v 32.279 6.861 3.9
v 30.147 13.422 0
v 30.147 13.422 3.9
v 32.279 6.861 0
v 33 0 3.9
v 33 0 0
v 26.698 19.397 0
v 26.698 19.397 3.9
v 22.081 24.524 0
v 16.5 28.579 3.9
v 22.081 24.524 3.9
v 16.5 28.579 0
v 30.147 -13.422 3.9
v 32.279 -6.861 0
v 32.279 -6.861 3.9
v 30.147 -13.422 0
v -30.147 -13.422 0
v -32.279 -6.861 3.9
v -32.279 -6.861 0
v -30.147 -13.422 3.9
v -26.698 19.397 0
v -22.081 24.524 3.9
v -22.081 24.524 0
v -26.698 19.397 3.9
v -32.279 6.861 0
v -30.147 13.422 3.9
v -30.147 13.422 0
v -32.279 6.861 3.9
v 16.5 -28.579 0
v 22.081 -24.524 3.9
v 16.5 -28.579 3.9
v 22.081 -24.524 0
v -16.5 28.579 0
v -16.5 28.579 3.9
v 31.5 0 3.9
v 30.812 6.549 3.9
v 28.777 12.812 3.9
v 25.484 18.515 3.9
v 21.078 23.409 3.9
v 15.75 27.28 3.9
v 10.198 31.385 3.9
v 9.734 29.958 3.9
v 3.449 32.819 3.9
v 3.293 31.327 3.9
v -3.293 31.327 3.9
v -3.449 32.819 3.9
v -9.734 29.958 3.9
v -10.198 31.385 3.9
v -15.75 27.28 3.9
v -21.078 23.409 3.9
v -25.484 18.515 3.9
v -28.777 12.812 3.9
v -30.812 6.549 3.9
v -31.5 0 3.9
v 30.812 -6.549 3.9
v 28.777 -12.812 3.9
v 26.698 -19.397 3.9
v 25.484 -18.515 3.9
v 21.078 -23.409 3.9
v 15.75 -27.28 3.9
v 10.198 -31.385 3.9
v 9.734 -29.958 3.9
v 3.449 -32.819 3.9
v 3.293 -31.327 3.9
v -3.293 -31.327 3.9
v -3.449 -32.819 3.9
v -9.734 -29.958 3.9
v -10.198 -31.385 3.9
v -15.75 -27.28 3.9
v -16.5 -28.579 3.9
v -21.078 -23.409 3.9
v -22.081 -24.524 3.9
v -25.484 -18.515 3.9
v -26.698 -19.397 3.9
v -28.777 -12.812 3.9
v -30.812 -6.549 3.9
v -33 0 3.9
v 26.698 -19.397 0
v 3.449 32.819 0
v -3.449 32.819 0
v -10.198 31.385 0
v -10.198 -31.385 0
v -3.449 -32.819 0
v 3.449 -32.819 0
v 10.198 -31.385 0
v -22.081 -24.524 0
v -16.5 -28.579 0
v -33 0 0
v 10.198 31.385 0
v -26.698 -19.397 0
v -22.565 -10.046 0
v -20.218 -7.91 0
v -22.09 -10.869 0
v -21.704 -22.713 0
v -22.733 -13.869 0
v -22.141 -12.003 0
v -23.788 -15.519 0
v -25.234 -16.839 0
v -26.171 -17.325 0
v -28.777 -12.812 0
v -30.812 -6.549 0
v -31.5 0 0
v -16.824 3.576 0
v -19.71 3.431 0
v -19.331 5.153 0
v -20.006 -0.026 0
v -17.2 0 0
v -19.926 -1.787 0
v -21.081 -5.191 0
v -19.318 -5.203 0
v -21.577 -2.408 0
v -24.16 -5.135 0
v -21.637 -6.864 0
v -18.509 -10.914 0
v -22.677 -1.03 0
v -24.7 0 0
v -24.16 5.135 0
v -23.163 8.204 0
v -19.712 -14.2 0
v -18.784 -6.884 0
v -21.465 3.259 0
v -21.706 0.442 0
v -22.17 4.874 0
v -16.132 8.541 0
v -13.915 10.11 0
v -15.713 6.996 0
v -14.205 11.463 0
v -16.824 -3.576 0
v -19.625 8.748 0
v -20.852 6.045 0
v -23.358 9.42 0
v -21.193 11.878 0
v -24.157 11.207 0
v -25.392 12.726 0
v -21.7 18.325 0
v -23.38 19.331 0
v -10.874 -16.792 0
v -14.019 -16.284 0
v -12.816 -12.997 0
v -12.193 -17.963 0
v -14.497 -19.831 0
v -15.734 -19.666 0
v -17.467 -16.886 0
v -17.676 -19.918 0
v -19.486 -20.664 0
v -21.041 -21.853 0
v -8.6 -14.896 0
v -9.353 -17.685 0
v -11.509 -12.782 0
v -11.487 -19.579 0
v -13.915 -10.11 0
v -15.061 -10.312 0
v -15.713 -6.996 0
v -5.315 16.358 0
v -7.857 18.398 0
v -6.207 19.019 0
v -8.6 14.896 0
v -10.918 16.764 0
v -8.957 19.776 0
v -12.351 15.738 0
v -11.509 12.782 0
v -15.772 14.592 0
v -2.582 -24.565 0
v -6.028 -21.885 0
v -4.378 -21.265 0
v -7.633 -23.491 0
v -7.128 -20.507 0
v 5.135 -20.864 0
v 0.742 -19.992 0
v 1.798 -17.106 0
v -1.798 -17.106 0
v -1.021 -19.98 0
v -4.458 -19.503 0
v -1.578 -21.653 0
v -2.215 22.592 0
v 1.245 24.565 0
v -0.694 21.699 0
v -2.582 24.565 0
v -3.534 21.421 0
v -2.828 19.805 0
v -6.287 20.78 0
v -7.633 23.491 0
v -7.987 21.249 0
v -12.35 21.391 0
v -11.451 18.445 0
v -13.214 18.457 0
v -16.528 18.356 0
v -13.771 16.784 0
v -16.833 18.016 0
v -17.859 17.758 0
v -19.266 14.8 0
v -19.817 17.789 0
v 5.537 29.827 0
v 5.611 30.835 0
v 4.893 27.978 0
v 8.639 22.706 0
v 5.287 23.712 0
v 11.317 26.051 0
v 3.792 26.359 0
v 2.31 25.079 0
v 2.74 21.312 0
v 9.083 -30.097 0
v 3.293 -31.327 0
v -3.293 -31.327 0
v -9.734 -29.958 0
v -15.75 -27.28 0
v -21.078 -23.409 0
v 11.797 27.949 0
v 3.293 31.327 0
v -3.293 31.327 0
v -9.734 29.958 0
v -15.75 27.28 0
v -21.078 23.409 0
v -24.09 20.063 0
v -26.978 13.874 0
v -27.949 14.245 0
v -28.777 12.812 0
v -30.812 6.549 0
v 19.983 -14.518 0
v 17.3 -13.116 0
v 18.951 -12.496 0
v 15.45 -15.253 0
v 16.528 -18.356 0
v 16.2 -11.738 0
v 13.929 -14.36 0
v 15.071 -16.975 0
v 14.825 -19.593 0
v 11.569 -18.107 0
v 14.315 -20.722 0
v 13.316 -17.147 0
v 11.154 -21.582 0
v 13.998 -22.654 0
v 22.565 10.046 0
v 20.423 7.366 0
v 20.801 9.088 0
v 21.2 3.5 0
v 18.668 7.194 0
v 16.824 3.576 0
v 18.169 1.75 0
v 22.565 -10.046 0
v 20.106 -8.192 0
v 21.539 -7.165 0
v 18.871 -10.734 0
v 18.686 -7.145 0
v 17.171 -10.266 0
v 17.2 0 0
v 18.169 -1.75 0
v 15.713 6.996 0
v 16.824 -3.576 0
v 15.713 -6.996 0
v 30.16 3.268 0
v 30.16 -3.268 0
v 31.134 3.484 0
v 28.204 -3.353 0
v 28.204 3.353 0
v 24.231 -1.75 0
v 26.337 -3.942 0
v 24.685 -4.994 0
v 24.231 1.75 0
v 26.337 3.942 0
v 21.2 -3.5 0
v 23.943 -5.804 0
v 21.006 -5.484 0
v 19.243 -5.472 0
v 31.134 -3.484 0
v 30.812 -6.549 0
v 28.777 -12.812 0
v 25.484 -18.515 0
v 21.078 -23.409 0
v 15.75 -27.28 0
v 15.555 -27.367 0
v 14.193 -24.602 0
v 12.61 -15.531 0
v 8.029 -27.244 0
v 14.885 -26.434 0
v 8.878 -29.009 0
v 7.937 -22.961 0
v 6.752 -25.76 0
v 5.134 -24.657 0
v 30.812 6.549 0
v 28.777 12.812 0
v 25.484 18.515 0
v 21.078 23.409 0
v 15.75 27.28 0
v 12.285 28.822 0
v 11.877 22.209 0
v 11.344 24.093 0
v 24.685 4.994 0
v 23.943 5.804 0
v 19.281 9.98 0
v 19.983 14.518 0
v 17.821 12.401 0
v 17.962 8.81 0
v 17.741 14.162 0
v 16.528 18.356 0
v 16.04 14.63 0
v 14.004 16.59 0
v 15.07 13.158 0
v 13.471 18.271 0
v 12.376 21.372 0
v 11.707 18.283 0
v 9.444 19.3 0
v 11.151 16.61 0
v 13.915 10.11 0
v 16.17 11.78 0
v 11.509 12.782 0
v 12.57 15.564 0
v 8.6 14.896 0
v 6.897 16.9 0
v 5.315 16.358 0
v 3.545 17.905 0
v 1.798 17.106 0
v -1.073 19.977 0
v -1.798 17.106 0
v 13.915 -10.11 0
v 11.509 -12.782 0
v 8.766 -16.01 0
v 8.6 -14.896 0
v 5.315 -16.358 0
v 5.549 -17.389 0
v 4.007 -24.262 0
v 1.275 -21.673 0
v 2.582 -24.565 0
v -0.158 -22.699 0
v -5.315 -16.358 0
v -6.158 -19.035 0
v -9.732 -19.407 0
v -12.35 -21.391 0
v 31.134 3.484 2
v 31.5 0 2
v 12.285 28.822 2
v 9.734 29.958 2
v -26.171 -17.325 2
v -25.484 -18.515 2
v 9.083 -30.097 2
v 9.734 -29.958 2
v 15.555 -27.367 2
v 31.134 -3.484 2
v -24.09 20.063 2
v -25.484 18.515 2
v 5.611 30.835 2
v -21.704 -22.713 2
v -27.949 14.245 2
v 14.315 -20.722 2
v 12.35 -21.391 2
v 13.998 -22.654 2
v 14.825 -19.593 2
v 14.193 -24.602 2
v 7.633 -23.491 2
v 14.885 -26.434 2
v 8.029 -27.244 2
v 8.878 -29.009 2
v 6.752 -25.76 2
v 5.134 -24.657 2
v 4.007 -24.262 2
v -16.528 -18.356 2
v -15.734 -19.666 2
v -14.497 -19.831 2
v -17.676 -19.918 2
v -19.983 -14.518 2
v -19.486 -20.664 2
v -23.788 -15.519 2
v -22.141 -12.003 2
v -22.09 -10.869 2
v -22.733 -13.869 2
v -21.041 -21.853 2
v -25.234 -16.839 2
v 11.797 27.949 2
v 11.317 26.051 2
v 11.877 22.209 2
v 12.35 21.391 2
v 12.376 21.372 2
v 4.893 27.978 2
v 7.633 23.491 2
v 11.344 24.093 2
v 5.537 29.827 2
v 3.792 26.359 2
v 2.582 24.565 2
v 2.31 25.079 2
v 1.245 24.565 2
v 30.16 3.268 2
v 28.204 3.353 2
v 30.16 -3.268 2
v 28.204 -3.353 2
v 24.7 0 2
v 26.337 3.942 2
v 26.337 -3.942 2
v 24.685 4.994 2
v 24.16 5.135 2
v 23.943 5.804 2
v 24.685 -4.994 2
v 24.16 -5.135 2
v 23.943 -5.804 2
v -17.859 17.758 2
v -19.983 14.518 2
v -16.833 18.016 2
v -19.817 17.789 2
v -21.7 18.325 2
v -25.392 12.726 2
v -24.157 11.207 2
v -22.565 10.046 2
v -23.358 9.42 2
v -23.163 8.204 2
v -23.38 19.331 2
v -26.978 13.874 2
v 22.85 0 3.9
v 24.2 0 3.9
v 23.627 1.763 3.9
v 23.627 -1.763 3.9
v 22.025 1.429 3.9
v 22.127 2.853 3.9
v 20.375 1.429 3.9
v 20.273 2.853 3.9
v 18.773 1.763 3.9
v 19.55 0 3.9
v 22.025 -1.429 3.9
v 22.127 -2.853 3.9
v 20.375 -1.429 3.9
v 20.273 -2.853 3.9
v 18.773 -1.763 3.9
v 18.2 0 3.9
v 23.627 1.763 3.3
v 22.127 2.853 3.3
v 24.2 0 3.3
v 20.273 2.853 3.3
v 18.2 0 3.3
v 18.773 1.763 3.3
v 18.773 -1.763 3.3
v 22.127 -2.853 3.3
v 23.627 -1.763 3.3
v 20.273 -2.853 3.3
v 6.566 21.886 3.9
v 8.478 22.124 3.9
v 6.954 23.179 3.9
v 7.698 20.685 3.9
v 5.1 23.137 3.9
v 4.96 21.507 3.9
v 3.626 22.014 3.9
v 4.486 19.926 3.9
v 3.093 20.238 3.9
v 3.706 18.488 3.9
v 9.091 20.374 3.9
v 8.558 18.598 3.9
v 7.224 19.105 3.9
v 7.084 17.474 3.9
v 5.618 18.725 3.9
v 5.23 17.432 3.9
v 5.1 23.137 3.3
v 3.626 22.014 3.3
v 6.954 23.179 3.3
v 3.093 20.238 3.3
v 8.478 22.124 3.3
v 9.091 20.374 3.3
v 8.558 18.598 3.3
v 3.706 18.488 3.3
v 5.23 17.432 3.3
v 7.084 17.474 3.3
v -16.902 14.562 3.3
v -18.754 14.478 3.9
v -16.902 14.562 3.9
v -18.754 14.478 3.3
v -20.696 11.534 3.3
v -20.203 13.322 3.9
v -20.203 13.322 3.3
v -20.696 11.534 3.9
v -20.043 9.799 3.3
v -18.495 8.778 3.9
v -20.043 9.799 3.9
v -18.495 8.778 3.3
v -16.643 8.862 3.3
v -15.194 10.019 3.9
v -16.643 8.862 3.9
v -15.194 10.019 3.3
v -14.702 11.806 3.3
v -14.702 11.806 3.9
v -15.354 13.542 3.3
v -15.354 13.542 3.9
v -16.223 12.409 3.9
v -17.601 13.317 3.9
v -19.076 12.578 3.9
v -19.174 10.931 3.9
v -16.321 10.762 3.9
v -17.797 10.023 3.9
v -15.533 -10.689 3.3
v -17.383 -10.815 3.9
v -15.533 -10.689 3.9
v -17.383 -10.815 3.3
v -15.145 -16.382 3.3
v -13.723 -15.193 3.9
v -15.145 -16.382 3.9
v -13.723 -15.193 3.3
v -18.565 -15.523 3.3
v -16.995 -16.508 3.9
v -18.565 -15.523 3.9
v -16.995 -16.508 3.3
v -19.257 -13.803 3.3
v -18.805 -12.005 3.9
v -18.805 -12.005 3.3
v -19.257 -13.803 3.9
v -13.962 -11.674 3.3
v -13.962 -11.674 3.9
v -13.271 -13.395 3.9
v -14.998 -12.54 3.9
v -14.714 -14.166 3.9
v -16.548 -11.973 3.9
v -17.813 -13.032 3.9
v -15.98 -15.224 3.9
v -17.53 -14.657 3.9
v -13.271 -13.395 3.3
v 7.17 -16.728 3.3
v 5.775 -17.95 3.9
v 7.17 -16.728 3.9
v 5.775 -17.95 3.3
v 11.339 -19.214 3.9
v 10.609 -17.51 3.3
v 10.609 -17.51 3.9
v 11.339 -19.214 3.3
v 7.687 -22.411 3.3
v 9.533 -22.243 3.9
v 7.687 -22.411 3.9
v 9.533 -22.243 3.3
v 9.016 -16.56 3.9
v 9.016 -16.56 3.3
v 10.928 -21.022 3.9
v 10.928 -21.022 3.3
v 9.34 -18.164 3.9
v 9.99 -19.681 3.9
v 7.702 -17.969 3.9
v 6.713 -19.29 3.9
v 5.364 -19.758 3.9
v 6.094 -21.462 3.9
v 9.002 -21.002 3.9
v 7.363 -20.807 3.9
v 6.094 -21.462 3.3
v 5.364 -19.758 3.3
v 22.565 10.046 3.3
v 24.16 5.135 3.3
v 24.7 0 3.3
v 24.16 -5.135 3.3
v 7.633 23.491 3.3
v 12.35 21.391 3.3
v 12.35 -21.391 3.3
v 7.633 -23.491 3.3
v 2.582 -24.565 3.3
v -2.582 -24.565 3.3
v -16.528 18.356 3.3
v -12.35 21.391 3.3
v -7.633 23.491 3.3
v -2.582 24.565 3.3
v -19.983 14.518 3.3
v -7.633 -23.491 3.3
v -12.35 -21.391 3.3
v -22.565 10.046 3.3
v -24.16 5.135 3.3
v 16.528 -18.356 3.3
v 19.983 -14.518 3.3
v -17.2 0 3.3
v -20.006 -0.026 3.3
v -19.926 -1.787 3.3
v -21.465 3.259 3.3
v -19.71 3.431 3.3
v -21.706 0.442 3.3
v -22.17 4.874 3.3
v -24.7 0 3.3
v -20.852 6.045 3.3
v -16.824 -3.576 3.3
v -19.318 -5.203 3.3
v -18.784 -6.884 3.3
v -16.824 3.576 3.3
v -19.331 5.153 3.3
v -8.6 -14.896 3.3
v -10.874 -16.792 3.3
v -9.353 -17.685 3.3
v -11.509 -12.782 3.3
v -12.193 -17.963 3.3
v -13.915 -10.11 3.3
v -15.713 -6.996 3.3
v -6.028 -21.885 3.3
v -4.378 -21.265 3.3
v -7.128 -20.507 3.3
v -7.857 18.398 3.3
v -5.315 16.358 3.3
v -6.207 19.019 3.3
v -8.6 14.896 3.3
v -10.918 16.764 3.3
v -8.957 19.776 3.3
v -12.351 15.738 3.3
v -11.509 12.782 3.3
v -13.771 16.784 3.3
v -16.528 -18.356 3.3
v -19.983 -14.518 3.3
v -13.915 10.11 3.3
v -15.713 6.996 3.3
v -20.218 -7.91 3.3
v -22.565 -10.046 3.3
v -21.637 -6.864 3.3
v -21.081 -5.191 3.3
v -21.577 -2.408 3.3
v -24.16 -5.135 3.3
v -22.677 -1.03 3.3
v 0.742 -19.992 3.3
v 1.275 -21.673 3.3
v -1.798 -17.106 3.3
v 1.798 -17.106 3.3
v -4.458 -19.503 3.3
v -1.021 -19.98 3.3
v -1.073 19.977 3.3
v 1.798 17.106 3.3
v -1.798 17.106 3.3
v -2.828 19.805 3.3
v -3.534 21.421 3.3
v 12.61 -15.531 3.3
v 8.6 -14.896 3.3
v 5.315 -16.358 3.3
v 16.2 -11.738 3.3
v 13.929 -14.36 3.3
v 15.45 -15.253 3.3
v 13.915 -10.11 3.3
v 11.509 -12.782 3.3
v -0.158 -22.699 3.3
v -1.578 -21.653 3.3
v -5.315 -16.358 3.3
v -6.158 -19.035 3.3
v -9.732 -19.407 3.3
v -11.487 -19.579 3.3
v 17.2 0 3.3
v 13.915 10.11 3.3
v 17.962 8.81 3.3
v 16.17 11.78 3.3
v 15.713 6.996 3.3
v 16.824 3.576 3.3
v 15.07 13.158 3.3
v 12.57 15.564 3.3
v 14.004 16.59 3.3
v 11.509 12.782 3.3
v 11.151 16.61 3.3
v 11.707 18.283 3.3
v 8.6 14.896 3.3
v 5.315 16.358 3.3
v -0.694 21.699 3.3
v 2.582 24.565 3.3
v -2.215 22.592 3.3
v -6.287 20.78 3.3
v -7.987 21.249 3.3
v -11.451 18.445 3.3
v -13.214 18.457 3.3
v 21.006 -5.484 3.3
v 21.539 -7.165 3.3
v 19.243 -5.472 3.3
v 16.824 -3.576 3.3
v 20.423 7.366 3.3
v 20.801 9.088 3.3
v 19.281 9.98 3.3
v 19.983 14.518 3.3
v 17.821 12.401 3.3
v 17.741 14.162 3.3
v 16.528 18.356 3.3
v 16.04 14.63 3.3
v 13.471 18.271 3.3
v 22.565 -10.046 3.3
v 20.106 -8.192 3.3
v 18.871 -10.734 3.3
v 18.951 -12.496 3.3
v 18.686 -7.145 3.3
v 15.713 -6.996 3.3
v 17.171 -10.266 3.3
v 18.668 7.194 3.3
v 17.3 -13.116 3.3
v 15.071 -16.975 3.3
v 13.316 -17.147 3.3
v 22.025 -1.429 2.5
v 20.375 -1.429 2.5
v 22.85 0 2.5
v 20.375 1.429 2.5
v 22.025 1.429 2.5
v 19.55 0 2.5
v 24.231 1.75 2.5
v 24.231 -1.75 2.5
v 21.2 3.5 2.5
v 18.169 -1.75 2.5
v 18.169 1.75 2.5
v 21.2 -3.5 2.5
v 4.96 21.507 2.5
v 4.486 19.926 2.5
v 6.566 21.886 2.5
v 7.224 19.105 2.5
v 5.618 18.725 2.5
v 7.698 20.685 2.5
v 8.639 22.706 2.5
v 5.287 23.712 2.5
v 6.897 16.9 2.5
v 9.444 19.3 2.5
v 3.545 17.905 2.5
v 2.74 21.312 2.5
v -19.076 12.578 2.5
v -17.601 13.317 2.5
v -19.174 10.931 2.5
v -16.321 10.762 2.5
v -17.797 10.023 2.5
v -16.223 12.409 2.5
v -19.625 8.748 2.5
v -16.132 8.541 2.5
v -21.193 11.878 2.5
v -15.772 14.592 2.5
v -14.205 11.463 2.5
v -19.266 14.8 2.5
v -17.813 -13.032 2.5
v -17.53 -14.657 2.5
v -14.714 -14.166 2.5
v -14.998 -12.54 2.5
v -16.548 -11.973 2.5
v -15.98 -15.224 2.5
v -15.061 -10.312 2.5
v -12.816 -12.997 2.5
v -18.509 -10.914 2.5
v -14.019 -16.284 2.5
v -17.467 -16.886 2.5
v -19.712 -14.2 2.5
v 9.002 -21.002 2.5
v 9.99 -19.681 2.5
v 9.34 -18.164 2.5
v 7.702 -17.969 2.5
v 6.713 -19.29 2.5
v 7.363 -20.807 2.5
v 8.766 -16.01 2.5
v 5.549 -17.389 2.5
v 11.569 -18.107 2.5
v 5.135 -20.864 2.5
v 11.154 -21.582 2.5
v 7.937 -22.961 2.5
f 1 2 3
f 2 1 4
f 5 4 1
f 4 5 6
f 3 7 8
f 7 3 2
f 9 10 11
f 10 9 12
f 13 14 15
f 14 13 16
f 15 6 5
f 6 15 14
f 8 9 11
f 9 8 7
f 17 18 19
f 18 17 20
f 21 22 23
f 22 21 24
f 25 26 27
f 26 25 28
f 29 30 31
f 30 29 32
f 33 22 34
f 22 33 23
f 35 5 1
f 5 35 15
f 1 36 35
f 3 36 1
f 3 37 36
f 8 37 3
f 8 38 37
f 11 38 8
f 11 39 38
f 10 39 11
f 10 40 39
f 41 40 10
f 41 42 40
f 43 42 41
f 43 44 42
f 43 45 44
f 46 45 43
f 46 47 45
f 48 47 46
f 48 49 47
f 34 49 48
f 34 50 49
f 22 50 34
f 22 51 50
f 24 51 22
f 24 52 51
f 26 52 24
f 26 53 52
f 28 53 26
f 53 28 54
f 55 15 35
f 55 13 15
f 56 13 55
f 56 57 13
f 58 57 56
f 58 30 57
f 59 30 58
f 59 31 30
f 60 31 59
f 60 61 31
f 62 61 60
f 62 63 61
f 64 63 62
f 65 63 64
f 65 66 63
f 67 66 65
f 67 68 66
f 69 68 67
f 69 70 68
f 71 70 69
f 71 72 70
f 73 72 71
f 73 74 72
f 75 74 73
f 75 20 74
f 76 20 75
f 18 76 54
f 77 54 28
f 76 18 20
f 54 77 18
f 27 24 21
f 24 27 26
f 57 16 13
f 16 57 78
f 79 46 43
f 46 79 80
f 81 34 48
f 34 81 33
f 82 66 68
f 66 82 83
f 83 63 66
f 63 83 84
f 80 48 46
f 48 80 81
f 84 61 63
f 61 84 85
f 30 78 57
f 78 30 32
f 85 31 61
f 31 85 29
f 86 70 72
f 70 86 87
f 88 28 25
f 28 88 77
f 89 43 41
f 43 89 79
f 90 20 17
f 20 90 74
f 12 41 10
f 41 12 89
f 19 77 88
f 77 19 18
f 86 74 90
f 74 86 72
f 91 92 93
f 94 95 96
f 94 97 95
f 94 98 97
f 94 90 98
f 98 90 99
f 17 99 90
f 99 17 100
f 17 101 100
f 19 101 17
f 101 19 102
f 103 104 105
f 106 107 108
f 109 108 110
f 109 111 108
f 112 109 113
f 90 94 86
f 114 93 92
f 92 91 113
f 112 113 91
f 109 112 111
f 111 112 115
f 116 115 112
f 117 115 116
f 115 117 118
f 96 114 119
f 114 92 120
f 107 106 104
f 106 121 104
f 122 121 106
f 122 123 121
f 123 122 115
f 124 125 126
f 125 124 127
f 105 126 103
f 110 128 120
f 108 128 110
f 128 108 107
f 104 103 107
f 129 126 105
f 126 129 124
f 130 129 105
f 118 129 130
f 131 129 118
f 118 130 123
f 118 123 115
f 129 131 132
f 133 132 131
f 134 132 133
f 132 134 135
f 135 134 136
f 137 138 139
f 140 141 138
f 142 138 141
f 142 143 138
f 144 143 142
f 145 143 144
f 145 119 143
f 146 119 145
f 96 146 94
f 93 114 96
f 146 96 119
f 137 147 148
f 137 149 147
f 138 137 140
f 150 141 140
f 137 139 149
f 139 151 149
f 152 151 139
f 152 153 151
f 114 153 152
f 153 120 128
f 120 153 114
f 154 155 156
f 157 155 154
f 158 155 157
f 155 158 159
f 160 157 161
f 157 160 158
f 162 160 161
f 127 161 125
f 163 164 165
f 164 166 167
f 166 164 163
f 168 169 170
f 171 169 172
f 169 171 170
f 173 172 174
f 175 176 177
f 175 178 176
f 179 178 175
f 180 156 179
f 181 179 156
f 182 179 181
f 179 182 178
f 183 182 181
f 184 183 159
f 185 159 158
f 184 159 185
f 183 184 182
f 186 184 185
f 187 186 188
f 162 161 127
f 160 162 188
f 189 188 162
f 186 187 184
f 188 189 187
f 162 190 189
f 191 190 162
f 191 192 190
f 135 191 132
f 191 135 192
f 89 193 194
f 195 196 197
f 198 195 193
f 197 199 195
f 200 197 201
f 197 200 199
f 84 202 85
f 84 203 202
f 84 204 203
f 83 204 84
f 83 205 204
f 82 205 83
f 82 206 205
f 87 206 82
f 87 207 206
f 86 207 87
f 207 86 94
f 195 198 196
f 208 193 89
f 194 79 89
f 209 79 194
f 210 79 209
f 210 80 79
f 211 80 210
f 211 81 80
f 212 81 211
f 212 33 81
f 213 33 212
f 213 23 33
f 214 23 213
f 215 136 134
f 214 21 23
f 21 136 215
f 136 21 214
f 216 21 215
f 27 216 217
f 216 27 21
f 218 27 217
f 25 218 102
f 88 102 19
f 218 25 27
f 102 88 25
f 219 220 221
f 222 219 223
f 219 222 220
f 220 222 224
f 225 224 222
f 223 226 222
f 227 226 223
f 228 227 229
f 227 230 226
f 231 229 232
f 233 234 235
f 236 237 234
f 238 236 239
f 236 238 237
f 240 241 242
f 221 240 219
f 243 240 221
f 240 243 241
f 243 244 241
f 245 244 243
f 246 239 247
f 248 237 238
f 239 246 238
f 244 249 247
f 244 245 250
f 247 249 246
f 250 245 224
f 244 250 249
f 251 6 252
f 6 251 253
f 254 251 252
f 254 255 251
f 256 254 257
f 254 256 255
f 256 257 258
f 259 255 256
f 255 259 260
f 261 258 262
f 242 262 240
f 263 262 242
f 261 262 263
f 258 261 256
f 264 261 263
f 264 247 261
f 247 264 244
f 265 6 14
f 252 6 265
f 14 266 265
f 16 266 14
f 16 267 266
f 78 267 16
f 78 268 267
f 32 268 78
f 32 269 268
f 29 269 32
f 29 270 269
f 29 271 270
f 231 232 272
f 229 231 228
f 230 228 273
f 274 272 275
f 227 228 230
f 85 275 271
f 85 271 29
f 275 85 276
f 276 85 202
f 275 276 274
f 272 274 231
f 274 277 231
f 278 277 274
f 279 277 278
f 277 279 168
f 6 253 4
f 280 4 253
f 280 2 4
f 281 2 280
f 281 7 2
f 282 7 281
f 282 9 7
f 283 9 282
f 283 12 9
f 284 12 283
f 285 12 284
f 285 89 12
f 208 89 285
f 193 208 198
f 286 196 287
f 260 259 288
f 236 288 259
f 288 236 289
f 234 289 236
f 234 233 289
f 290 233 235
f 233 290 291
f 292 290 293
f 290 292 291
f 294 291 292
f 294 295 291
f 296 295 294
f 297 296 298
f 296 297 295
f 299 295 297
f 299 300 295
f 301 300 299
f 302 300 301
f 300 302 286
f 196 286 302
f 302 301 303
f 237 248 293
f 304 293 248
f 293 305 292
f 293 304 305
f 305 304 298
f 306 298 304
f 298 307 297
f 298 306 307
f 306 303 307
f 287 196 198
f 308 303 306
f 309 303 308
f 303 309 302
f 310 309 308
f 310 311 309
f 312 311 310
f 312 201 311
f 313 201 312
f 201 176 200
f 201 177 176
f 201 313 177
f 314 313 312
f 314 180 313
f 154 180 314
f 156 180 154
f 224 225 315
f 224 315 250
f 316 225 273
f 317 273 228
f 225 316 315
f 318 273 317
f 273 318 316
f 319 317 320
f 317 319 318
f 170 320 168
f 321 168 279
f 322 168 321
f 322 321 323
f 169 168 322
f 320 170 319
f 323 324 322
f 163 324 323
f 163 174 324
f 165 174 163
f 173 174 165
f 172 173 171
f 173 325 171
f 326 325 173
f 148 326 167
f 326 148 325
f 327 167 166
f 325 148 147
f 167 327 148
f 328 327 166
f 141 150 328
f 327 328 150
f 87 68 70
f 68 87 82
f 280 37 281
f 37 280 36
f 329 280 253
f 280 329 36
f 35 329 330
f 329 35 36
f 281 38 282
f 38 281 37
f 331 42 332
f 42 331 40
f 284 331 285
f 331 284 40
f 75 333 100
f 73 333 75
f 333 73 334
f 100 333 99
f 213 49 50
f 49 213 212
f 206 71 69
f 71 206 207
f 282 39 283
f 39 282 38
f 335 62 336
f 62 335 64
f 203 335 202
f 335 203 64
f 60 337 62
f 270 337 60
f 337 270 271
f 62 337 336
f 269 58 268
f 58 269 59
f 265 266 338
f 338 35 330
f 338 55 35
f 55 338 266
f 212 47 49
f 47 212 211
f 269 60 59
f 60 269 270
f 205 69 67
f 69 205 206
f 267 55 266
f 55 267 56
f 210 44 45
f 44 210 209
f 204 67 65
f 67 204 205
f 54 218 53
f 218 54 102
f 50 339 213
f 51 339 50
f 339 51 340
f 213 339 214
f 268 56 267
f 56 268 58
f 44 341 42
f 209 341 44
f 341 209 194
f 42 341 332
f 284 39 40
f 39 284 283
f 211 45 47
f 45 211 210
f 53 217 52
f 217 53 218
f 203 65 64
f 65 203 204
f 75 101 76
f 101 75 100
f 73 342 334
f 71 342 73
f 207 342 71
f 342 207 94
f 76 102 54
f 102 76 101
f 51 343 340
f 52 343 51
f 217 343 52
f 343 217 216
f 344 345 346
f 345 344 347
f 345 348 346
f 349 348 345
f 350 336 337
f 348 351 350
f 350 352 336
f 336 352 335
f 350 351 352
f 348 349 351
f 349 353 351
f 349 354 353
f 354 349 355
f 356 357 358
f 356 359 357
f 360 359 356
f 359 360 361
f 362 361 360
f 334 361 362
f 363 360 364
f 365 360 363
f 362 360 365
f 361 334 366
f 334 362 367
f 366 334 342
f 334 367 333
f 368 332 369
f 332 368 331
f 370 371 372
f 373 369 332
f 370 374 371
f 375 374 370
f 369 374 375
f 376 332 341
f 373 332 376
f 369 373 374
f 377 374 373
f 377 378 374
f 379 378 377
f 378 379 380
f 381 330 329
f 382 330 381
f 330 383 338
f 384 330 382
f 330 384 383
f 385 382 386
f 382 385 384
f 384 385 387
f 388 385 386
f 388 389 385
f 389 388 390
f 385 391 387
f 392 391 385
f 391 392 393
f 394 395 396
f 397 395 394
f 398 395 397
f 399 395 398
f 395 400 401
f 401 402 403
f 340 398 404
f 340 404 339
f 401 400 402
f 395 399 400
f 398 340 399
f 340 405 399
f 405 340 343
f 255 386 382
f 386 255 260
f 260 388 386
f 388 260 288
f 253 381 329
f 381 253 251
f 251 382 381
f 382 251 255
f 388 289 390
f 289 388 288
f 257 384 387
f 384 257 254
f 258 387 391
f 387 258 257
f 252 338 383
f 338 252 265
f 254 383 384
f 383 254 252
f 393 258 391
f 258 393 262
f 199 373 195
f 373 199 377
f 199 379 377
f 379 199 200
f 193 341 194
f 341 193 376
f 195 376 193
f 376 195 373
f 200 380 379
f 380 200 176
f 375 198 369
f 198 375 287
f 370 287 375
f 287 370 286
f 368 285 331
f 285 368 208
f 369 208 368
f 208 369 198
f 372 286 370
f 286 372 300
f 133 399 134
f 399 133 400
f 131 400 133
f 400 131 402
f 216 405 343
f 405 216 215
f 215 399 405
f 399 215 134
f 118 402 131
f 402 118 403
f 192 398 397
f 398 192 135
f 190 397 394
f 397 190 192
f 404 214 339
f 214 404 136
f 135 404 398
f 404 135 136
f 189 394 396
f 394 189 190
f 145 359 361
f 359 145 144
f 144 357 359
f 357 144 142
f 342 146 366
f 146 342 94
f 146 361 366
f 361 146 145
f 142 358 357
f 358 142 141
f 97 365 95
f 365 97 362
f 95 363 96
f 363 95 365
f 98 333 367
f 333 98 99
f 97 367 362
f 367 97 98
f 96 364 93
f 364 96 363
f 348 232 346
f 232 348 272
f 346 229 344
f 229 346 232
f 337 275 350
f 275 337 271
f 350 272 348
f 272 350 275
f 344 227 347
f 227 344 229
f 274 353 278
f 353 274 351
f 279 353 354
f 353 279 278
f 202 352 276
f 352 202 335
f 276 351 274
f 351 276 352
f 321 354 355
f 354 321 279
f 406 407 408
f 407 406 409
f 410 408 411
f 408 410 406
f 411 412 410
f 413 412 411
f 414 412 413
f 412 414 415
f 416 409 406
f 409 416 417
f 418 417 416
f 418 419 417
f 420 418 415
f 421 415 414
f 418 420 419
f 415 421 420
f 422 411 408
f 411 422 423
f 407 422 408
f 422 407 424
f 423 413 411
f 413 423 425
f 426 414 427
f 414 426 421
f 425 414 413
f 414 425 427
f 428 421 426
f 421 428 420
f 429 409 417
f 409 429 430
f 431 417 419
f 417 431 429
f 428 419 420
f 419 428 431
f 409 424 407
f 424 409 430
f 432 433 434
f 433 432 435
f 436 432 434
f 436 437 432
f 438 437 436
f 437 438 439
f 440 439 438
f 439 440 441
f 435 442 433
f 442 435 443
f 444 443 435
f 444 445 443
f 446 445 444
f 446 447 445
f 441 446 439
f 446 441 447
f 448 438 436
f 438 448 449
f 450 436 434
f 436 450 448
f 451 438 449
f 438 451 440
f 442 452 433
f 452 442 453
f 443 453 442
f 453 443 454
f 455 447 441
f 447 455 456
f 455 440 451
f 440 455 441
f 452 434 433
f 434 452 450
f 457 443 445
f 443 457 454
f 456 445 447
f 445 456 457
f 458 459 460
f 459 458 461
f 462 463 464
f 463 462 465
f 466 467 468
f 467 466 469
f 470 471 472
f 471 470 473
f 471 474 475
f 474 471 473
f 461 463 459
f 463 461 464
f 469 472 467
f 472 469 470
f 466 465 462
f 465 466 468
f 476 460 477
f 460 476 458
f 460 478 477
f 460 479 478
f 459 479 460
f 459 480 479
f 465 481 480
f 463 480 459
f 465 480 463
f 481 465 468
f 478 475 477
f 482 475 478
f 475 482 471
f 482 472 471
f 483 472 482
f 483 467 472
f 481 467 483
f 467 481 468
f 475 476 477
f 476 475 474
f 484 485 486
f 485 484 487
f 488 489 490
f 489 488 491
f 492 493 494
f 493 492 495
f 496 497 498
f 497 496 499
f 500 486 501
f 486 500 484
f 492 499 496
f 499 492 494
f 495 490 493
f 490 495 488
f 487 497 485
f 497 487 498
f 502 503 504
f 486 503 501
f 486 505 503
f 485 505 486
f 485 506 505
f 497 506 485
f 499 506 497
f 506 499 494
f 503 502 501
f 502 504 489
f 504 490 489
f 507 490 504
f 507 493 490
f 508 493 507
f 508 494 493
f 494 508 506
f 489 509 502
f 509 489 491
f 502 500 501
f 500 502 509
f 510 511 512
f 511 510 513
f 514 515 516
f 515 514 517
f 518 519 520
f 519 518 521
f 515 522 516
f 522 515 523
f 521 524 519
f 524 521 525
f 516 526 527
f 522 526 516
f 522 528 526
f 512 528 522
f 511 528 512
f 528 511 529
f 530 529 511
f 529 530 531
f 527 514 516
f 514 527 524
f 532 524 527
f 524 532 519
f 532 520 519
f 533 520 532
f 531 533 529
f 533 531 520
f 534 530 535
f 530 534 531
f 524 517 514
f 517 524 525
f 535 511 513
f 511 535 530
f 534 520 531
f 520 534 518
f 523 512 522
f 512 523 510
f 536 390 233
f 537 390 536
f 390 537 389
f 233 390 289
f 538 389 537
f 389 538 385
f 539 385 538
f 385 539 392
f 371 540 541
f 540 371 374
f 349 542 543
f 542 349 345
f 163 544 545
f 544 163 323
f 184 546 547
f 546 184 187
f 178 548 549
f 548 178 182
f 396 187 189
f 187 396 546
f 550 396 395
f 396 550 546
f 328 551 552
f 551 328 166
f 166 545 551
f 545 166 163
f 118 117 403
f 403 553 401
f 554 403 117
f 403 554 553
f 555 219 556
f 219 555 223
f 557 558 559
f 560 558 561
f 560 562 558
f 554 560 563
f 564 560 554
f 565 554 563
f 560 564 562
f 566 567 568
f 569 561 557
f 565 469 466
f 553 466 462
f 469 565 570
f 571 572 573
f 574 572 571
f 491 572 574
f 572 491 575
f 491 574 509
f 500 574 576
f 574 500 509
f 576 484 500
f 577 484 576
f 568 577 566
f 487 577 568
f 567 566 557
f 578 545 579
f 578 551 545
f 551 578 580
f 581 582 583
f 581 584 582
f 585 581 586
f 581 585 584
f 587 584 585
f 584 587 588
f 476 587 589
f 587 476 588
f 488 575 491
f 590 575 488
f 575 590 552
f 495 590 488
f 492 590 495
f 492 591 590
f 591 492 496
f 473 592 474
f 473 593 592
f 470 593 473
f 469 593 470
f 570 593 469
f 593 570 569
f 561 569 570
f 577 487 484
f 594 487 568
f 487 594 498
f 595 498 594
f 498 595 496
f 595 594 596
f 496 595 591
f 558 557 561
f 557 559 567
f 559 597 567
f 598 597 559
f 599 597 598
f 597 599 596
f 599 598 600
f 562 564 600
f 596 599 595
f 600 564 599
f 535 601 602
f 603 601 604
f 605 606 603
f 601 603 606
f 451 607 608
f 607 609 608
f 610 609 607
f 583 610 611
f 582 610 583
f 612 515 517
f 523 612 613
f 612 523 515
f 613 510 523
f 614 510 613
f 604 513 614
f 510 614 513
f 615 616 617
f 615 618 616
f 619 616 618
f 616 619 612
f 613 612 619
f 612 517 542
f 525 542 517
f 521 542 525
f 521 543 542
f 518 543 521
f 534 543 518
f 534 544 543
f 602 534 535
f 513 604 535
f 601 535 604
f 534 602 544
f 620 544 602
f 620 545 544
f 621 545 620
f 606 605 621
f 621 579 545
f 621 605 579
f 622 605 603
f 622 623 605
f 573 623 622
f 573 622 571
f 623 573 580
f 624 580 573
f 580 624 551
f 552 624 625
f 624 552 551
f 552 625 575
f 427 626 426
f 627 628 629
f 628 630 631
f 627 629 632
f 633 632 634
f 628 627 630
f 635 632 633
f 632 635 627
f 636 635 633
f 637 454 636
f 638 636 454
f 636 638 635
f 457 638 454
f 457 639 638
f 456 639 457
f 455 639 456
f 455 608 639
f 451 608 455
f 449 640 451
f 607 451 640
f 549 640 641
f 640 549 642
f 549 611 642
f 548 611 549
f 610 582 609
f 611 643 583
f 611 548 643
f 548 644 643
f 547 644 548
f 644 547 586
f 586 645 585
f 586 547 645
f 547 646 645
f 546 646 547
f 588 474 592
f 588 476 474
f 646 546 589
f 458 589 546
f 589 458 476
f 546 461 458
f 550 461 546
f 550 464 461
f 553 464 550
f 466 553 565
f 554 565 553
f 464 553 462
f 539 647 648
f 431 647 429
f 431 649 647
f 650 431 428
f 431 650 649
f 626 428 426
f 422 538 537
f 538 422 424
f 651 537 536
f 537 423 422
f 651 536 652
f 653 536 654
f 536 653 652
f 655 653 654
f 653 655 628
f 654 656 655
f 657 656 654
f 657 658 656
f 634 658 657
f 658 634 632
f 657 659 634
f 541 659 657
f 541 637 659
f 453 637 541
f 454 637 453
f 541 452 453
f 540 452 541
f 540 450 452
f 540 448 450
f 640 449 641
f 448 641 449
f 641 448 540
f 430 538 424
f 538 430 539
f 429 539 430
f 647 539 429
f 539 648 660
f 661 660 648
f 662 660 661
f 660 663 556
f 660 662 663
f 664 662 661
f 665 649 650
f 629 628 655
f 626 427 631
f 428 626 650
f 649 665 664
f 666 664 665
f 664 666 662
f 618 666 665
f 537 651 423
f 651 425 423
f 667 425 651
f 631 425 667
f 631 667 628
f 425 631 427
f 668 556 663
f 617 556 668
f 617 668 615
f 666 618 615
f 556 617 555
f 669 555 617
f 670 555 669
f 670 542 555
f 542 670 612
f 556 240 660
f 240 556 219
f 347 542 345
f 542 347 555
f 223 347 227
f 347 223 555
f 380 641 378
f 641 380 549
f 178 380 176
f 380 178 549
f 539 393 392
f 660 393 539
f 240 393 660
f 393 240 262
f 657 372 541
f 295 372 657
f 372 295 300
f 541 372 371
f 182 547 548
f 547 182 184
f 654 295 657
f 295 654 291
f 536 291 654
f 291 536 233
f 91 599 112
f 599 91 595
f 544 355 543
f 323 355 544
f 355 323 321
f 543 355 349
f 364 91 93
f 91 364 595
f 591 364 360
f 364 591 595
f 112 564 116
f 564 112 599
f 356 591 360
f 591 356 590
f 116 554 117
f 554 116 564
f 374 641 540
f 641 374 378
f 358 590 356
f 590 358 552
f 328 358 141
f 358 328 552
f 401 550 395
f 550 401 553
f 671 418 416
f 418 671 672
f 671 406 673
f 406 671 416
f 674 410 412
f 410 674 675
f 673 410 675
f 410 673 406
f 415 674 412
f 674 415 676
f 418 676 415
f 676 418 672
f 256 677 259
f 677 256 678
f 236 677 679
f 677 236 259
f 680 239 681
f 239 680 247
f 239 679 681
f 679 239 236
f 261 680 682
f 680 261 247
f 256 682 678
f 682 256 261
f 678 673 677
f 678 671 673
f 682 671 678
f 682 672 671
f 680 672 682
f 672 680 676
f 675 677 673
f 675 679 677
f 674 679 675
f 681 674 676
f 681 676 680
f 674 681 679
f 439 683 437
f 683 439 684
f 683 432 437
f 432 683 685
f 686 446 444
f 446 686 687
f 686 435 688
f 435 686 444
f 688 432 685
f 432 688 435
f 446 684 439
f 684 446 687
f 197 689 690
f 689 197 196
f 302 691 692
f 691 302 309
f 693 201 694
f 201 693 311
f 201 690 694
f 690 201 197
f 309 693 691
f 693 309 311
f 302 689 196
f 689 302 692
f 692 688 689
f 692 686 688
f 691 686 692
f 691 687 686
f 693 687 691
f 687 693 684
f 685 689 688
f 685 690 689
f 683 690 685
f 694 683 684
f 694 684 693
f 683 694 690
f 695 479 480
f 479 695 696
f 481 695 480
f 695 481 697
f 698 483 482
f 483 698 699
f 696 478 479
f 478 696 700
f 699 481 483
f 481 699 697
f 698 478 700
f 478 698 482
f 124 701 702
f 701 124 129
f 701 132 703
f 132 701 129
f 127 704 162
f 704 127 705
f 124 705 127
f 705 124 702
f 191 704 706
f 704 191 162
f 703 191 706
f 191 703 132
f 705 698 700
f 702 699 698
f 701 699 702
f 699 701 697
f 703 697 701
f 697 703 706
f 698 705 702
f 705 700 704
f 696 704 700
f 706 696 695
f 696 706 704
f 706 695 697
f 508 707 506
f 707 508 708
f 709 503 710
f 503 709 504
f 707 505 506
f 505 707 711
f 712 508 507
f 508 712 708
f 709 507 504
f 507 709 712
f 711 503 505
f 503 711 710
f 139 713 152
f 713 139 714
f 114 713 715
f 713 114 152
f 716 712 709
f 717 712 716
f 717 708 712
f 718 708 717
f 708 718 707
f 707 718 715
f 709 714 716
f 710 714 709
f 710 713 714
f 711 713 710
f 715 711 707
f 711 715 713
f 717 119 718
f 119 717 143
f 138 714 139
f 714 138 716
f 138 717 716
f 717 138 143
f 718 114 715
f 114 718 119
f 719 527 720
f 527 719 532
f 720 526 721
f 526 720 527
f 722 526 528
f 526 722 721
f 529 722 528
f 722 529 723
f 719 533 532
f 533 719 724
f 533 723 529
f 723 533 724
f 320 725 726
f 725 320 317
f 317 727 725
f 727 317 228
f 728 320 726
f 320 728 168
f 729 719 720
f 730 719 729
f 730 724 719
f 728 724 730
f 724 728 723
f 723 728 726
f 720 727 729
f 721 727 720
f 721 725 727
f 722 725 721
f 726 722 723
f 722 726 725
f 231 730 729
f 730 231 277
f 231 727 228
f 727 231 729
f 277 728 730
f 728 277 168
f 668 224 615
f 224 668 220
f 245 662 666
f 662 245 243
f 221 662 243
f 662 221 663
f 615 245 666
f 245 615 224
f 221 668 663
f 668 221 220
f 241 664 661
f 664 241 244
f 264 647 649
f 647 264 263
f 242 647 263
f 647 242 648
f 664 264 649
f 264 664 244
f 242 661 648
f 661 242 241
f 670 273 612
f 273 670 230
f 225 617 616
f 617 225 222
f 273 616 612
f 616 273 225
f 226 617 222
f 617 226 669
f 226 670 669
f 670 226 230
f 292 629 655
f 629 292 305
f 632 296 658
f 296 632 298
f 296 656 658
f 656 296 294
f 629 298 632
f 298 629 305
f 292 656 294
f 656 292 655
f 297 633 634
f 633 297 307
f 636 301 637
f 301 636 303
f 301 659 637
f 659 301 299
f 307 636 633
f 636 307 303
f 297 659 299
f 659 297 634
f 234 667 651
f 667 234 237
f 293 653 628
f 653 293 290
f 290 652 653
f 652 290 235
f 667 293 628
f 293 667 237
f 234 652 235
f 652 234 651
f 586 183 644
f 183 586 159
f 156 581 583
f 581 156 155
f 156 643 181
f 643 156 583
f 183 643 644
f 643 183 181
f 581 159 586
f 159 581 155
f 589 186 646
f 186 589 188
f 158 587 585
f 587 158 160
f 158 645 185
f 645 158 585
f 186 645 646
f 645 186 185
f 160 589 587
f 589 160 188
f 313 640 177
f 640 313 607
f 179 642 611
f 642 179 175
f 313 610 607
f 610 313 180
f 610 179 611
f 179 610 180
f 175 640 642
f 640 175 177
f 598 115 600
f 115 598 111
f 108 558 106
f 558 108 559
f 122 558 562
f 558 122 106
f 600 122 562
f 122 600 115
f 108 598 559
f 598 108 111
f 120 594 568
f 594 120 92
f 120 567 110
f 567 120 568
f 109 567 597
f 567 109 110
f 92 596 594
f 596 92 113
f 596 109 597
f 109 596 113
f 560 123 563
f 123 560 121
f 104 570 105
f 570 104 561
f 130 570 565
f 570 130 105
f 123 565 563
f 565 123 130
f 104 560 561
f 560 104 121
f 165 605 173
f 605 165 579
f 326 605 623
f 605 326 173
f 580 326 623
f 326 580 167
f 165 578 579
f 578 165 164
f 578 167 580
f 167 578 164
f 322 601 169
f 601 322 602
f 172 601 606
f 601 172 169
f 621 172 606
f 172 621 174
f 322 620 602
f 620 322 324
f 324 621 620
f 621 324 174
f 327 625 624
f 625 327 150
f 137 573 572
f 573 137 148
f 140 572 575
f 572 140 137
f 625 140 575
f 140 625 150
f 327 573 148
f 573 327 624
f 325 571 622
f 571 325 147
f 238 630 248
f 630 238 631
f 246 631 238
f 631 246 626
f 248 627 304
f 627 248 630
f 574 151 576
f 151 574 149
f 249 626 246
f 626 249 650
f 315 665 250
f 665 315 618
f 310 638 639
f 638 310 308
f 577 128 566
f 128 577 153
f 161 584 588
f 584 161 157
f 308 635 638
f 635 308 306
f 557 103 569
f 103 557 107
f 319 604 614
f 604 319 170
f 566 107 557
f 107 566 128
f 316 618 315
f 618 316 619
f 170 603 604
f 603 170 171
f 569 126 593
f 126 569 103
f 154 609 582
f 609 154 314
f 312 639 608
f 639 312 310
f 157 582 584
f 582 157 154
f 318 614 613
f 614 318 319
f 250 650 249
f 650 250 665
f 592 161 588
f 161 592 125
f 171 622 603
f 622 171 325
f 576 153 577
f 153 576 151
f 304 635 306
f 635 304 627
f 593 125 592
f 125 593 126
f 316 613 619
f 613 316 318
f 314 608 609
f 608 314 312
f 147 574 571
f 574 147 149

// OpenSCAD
//$fa = 6;
//$fs = 0.4;

under_carrier();

module under_carrier(){
    full_height = 3.9;
    difference() {
        union() {
            //outer contact race
            difference() {
                cylinder (d=66, h=full_height);
                translate([0,0,-1]) cylinder (d=63, h=full_height+2);
            }
            
            //wings
            intersection() {
                translate([0,0,-1]) cylinder (d=65, h=3);
                union(){
                    for (i = [0:4]) {
                        rotate([0,0,i*73.3]) difference() {
                            translate([27.4,0,0]) cylinder (d=15, h=2);
                            rotate([0,0,20]) translate([27.4+4,0,-1]) cylinder (d=15, h=4);
                            rotate([0,0,-20]) translate([27.4+4,0,-1]) cylinder (d=15, h=4);
                        }
                    }
                }
            }
            
            translate([0,0,0]) cylinder (r=21.2+3.5, h=full_height-0.6);
            // gear mounts
            for (i = [0, 73.3, 2*73.3, 3*73.3, 4*73.3]) {
                rotate([0,0,i]) translate([21.2,0,0]) cylinder(d=6, h=full_height);
            }
        }
        translate([0,0,-1]) cylinder (r=21.2-4, h=6);
        // gear mounts
        for (i = [0:4]) {
            rotate([0,0,i*73.3]) translate([21.2,0,0]) cylinder(d=3.3, h=6);
            rotate([0,0,i*73.3]) translate([21.2,0,-1]) rotate([0,0,90]) cylinder(d=7, h=full_height-1.4+1, $fn=6);
        }
        
        // weight saving holes
        for (i = [0:4]) {
            rotate([0,0, (i * 72) - ((360 - (4*73.3))/2)]) translate([21.2,0,-1]) cylinder(d=3, h=6);
            rotate([0,0, (i * 72) - ((360 - (4*73.3))/2) + 15]) translate([21.2,0,-1]) cylinder(d=3, h=6);
            rotate([0,0, (i * 72) - ((360 - (4*73.3))/2) - 15]) translate([21.2,0,-1]) cylinder(d=3, h=6);
        }
    }
}
